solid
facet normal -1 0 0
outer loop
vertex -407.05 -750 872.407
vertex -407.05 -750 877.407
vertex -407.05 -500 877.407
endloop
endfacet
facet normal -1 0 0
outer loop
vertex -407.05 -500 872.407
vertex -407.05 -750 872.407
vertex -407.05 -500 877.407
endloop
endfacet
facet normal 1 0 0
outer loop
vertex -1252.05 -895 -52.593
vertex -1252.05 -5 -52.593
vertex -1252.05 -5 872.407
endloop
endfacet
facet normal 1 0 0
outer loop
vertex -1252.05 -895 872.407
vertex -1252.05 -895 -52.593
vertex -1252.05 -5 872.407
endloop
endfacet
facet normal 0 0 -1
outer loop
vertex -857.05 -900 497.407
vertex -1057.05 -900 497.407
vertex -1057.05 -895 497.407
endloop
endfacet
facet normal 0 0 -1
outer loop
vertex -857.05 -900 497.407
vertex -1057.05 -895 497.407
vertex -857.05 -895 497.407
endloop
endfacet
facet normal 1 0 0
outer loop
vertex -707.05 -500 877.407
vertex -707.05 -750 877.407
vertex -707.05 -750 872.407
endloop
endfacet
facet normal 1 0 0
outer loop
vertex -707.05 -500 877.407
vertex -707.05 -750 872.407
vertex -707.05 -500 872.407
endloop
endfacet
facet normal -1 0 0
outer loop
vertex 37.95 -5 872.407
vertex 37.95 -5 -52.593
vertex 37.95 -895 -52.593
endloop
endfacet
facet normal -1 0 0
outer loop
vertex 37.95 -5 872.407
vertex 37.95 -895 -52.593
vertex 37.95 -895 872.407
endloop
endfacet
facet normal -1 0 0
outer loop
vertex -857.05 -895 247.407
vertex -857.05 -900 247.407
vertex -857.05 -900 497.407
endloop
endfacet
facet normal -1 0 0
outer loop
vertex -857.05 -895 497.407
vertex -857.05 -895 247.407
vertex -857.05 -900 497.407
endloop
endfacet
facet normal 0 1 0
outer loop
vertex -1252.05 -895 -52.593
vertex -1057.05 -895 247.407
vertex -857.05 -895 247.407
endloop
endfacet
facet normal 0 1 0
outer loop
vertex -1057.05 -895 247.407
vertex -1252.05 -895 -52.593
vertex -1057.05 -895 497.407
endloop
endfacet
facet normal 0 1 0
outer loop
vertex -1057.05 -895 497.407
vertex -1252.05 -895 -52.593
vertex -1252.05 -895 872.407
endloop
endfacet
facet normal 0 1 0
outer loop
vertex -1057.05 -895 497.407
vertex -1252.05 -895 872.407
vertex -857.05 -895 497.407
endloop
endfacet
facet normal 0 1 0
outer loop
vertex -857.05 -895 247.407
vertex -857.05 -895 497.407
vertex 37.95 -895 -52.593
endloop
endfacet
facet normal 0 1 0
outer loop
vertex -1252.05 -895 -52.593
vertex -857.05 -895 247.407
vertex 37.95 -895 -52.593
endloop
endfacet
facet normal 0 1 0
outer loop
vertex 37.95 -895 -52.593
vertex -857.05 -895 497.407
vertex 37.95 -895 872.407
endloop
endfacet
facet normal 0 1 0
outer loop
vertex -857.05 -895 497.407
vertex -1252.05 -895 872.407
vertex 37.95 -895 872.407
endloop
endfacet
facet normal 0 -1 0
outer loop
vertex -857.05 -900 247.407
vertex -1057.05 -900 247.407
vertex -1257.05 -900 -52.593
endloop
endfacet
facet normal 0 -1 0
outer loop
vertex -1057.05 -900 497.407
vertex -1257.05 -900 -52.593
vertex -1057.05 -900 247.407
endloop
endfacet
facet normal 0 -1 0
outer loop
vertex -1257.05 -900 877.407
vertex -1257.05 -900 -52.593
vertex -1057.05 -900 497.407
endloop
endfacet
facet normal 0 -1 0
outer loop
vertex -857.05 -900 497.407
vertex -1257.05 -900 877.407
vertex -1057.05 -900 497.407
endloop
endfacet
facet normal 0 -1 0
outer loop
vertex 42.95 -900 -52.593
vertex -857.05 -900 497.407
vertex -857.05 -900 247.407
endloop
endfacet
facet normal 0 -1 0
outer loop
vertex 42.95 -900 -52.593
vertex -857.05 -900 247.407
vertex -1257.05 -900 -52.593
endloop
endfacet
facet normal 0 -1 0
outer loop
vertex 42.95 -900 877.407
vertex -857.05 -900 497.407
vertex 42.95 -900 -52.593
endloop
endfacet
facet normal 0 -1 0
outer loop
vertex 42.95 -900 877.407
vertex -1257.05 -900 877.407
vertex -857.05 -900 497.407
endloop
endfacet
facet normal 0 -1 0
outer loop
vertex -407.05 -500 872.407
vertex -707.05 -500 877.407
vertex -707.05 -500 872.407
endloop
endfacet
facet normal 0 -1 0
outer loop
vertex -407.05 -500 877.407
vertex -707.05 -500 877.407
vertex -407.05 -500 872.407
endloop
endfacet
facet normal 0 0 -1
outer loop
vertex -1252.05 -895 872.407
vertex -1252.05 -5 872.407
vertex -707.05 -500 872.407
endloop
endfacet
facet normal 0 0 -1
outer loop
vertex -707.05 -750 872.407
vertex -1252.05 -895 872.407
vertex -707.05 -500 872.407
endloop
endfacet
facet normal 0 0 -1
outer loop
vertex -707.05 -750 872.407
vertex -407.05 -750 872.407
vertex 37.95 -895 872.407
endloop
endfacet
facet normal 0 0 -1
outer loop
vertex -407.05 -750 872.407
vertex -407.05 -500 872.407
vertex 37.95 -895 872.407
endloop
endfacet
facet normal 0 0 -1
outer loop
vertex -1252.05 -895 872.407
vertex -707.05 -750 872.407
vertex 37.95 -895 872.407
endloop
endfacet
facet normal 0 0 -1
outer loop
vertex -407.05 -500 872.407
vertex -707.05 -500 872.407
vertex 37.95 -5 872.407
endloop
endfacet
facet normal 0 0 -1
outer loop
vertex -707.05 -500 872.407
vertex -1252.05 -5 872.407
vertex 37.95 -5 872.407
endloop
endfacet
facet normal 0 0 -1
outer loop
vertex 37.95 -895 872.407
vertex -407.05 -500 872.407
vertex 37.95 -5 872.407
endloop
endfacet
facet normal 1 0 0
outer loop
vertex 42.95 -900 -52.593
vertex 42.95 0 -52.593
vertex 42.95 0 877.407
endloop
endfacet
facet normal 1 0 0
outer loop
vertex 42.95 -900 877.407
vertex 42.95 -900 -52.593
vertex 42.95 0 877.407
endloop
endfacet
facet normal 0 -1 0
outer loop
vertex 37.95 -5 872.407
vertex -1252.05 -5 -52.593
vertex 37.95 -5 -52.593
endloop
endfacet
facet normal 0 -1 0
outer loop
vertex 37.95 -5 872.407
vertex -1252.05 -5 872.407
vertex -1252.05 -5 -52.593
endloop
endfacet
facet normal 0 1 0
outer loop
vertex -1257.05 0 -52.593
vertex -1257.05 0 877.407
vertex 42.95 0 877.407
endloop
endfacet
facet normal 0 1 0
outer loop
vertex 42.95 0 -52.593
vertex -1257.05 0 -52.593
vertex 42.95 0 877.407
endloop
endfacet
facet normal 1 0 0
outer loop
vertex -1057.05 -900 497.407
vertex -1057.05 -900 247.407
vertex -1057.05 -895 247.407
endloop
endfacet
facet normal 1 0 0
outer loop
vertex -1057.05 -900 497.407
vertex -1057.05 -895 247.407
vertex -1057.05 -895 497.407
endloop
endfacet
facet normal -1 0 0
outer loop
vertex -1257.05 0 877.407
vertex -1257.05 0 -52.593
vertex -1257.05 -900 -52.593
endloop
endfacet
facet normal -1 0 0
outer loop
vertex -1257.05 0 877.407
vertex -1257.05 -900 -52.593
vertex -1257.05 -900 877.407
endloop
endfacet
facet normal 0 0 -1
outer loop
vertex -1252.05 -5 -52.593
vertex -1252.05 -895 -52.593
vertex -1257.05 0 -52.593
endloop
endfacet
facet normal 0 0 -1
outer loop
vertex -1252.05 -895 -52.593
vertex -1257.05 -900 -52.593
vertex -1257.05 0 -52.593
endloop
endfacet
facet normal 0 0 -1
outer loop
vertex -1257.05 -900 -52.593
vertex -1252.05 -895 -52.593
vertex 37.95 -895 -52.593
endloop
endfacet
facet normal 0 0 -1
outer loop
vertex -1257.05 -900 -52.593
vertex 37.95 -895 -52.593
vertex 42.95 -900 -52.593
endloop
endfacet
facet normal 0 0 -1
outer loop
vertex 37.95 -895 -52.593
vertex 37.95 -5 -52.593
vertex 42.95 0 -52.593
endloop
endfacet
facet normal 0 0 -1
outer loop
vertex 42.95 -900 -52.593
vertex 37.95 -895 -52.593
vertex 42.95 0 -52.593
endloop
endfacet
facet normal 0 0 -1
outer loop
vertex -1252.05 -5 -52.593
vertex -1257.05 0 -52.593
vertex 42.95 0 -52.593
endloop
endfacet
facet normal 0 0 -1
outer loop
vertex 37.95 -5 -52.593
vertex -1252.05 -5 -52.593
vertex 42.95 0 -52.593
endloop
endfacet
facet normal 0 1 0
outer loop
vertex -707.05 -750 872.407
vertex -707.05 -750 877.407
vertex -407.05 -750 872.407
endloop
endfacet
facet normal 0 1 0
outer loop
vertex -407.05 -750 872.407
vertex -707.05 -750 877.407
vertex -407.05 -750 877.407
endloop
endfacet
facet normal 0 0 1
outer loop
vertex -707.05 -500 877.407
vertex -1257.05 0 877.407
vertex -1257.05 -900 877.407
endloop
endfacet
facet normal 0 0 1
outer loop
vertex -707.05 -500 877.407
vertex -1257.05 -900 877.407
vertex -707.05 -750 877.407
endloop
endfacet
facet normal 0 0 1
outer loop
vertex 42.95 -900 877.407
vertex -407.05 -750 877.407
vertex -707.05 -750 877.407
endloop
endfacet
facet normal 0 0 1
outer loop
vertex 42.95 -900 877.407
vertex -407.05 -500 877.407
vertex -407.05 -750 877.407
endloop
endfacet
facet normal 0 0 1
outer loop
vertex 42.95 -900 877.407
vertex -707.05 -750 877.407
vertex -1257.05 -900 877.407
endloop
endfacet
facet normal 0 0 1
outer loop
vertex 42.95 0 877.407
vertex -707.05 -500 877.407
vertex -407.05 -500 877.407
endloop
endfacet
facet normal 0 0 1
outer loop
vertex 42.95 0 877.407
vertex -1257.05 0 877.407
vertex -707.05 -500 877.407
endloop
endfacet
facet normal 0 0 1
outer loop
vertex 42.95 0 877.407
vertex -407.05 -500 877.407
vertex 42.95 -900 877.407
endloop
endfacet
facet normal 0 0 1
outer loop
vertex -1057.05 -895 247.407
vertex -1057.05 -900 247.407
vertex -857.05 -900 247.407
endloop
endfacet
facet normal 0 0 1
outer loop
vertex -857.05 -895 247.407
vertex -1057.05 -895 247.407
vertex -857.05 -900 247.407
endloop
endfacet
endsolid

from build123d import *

# Parameters (mm, degrees)
F0_W     = 1300
F0_H     = 930
F1_DEPTH = 900
F2_T     = -5
F3_W     = 200
F3_H     = 250
F4_DEPTH = 25
F5_W     = 300
F5_H     = 250
F6_DEPTH = 25


with BuildPart() as f1:
    # F0 (on Front) → F1 (new body)
    with BuildSketch(Plane.XZ):
        with Locations((-607.050044, 412.407453)):
            Rectangle(F0_W, F0_H)
    extrude(amount=F1_DEPTH)

    # F2
    f2_openings = [f1.faces().sort_by_distance(p)[0] for p in [
        (-607.050044, -450, -52.592547),
    ]]
    offset(amount=F2_T, openings=f2_openings)

    # F3 (on face) → F4 (cut)
    with BuildSketch(Plane.XZ.offset(900)):
        with Locations((-957.050044, 372.407453)):
            Rectangle(F3_W, F3_H)
    extrude(amount=-F4_DEPTH, mode=Mode.SUBTRACT)

    # F5 (on face) → F6 (cut)
    with BuildSketch(Plane.XY.offset(877.407453)):
        with Locations((-557.050044, -625)):
            Rectangle(F5_W, F5_H)
    extrude(amount=-F6_DEPTH, mode=Mode.SUBTRACT)


solid = f1.part
